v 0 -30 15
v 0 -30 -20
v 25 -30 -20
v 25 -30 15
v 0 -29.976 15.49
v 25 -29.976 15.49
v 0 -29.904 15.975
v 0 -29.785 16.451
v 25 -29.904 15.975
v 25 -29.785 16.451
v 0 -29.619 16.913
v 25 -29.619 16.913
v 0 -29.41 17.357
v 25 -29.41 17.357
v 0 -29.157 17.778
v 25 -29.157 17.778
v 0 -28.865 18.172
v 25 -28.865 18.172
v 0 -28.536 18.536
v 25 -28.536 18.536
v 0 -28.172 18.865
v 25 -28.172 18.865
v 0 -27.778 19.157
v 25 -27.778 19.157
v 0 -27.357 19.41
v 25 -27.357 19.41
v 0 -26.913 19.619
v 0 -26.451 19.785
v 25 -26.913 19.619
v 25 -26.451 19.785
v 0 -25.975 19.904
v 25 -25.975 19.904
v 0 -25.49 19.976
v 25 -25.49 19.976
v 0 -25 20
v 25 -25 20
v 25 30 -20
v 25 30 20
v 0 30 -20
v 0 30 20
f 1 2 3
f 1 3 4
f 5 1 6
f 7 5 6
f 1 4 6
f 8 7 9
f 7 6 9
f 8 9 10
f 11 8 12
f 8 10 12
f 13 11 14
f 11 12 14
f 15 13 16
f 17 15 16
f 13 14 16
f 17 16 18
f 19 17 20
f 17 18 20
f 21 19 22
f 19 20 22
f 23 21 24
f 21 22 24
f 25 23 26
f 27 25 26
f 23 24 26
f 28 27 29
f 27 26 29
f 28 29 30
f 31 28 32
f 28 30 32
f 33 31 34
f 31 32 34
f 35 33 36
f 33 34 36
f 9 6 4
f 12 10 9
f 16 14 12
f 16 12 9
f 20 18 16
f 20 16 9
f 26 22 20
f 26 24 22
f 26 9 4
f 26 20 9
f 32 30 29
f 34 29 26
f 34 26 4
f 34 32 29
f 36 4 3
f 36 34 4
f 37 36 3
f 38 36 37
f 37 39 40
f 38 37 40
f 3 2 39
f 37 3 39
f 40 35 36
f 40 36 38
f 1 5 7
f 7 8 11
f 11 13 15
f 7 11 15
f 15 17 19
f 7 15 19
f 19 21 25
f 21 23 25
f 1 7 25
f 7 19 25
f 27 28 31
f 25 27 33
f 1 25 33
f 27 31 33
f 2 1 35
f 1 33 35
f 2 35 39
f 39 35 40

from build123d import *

# Parameters (mm, degrees)
F0_W     = 60
F0_H     = 40
F1_DEPTH = 25
F2_R     = 5


with BuildPart() as f1:
    # F0 (on Right) → F1 (new body)
    with BuildSketch(Plane.YZ):
        Rectangle(F0_W, F0_H)
    extrude(amount=F1_DEPTH)

    # F2
    f2_edges = [f1.edges().sort_by_distance(p)[0] for p in [
        (12.5, -30, 20),
    ]]
    fillet(f2_edges, radius=F2_R)


solid = f1.part
